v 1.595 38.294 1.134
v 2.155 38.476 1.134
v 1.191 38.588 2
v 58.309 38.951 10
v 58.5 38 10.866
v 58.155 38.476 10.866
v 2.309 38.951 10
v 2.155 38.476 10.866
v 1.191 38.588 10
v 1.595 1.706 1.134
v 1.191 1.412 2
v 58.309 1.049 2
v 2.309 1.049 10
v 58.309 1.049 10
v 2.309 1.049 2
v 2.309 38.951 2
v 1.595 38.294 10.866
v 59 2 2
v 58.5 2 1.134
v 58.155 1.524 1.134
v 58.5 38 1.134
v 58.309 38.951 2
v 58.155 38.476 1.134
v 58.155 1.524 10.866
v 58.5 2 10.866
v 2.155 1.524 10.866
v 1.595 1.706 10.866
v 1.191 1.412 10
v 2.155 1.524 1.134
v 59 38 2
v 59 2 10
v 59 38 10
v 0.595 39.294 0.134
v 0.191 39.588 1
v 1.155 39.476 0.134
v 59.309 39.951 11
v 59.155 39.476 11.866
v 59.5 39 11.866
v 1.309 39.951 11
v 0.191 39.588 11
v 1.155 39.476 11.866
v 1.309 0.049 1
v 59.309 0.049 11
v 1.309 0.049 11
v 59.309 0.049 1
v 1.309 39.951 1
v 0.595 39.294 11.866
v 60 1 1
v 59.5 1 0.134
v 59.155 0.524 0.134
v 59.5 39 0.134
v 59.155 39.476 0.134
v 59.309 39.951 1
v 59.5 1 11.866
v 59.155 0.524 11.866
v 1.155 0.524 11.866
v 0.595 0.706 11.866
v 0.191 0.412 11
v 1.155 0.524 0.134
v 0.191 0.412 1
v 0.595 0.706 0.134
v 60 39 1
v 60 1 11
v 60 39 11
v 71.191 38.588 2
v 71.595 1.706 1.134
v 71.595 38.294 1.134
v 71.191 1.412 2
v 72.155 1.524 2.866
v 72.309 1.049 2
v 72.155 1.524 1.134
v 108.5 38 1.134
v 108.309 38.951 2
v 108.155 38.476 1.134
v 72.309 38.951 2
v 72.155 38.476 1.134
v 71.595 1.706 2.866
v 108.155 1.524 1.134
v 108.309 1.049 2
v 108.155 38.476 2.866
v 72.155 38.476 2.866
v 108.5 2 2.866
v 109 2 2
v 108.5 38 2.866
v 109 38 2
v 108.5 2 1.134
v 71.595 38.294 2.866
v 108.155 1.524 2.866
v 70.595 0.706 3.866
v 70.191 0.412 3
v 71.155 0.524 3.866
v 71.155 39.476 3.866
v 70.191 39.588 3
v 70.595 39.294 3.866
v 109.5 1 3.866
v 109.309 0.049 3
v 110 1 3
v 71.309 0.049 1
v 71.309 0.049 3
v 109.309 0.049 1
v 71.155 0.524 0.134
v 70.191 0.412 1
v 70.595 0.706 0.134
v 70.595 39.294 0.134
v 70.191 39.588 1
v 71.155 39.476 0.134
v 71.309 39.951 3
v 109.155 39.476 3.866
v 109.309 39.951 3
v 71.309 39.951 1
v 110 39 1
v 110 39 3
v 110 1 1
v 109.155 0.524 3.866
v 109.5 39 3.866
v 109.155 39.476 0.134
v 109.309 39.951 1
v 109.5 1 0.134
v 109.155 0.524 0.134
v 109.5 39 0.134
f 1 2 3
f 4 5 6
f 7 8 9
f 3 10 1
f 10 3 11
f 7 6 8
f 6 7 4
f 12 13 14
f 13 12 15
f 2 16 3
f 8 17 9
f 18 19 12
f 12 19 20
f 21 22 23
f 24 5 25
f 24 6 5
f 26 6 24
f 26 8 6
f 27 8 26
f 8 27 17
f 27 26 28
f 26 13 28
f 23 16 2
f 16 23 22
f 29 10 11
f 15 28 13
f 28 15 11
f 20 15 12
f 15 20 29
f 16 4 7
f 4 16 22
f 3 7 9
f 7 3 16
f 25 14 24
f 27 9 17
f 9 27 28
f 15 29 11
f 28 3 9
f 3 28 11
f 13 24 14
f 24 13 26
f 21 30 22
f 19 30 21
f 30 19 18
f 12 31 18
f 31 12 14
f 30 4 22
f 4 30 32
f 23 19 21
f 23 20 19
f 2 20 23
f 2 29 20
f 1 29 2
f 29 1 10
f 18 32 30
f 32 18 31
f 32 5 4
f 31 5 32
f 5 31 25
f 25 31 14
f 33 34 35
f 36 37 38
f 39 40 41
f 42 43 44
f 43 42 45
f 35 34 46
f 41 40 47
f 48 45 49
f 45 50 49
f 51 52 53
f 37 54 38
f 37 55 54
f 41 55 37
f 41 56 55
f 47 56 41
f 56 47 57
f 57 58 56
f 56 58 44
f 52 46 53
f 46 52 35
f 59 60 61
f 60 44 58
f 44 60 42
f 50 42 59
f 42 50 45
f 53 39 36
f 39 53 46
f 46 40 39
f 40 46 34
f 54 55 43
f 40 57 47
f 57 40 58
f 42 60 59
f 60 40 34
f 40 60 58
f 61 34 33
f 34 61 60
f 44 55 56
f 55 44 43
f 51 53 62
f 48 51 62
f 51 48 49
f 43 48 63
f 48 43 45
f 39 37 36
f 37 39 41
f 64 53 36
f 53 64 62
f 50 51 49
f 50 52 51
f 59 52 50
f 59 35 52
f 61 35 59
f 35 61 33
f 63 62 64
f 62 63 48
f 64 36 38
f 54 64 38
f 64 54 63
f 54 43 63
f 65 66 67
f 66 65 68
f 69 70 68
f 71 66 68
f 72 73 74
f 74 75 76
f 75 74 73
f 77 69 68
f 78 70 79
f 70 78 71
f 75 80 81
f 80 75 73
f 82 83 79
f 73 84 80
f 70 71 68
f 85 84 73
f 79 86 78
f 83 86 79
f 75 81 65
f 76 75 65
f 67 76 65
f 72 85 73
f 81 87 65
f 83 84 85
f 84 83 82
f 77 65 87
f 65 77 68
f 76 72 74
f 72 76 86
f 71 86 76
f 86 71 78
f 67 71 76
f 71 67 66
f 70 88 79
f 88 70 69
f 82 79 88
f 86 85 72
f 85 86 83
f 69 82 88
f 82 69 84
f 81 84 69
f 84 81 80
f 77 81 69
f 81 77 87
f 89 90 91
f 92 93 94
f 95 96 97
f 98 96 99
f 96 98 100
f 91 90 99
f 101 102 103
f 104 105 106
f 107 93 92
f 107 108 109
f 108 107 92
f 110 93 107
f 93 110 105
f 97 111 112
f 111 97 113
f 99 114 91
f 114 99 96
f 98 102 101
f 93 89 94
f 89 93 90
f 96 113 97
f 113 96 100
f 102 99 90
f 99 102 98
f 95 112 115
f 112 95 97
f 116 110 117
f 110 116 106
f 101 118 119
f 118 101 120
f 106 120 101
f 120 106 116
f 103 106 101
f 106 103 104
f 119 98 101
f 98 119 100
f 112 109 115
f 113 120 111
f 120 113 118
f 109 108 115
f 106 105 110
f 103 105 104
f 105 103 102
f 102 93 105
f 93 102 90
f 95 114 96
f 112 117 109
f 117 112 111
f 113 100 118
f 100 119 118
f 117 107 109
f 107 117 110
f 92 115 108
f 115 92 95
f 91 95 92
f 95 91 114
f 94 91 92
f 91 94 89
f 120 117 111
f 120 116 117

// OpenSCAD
module hollowBoxWithRoundedCorners(height, width, length, wall_thickness, corner_radius) {
    difference() {
        // Outer rounded box
        hull() {
            for (x = [0, length - corner_radius * 2])
                for (y = [0, width - corner_radius * 2])
                    for (z = [0, height - corner_radius * 2])
                        translate([x + corner_radius, y + corner_radius, z + corner_radius])
                            sphere(corner_radius);
        }

        union() {
            // Inner cavity to make the box hollow
            translate([wall_thickness, wall_thickness, wall_thickness])
            hull() {
                for (x = [0, length - wall_thickness * 2 - corner_radius * 2])
                    for (y = [0, width - wall_thickness * 2 - corner_radius * 2])
                        for (z = [0, height - wall_thickness * 2 - corner_radius * 2])
                            translate([x + corner_radius, y + corner_radius, z + corner_radius])
                                sphere(corner_radius);
            }

            // Removing the bottom
            translate([0, 0, -wall_thickness])
            cube([length, width, wall_thickness]);
        }
    }
}

// First box without bottom
hollowBoxWithRoundedCorners(12, 40, 60, 1, 1);

translate([70, 0, 0]) // Move the second box to avoid overlap
// Second box without bottom
hollowBoxWithRoundedCorners(4, 40, 40, 1, 1);
